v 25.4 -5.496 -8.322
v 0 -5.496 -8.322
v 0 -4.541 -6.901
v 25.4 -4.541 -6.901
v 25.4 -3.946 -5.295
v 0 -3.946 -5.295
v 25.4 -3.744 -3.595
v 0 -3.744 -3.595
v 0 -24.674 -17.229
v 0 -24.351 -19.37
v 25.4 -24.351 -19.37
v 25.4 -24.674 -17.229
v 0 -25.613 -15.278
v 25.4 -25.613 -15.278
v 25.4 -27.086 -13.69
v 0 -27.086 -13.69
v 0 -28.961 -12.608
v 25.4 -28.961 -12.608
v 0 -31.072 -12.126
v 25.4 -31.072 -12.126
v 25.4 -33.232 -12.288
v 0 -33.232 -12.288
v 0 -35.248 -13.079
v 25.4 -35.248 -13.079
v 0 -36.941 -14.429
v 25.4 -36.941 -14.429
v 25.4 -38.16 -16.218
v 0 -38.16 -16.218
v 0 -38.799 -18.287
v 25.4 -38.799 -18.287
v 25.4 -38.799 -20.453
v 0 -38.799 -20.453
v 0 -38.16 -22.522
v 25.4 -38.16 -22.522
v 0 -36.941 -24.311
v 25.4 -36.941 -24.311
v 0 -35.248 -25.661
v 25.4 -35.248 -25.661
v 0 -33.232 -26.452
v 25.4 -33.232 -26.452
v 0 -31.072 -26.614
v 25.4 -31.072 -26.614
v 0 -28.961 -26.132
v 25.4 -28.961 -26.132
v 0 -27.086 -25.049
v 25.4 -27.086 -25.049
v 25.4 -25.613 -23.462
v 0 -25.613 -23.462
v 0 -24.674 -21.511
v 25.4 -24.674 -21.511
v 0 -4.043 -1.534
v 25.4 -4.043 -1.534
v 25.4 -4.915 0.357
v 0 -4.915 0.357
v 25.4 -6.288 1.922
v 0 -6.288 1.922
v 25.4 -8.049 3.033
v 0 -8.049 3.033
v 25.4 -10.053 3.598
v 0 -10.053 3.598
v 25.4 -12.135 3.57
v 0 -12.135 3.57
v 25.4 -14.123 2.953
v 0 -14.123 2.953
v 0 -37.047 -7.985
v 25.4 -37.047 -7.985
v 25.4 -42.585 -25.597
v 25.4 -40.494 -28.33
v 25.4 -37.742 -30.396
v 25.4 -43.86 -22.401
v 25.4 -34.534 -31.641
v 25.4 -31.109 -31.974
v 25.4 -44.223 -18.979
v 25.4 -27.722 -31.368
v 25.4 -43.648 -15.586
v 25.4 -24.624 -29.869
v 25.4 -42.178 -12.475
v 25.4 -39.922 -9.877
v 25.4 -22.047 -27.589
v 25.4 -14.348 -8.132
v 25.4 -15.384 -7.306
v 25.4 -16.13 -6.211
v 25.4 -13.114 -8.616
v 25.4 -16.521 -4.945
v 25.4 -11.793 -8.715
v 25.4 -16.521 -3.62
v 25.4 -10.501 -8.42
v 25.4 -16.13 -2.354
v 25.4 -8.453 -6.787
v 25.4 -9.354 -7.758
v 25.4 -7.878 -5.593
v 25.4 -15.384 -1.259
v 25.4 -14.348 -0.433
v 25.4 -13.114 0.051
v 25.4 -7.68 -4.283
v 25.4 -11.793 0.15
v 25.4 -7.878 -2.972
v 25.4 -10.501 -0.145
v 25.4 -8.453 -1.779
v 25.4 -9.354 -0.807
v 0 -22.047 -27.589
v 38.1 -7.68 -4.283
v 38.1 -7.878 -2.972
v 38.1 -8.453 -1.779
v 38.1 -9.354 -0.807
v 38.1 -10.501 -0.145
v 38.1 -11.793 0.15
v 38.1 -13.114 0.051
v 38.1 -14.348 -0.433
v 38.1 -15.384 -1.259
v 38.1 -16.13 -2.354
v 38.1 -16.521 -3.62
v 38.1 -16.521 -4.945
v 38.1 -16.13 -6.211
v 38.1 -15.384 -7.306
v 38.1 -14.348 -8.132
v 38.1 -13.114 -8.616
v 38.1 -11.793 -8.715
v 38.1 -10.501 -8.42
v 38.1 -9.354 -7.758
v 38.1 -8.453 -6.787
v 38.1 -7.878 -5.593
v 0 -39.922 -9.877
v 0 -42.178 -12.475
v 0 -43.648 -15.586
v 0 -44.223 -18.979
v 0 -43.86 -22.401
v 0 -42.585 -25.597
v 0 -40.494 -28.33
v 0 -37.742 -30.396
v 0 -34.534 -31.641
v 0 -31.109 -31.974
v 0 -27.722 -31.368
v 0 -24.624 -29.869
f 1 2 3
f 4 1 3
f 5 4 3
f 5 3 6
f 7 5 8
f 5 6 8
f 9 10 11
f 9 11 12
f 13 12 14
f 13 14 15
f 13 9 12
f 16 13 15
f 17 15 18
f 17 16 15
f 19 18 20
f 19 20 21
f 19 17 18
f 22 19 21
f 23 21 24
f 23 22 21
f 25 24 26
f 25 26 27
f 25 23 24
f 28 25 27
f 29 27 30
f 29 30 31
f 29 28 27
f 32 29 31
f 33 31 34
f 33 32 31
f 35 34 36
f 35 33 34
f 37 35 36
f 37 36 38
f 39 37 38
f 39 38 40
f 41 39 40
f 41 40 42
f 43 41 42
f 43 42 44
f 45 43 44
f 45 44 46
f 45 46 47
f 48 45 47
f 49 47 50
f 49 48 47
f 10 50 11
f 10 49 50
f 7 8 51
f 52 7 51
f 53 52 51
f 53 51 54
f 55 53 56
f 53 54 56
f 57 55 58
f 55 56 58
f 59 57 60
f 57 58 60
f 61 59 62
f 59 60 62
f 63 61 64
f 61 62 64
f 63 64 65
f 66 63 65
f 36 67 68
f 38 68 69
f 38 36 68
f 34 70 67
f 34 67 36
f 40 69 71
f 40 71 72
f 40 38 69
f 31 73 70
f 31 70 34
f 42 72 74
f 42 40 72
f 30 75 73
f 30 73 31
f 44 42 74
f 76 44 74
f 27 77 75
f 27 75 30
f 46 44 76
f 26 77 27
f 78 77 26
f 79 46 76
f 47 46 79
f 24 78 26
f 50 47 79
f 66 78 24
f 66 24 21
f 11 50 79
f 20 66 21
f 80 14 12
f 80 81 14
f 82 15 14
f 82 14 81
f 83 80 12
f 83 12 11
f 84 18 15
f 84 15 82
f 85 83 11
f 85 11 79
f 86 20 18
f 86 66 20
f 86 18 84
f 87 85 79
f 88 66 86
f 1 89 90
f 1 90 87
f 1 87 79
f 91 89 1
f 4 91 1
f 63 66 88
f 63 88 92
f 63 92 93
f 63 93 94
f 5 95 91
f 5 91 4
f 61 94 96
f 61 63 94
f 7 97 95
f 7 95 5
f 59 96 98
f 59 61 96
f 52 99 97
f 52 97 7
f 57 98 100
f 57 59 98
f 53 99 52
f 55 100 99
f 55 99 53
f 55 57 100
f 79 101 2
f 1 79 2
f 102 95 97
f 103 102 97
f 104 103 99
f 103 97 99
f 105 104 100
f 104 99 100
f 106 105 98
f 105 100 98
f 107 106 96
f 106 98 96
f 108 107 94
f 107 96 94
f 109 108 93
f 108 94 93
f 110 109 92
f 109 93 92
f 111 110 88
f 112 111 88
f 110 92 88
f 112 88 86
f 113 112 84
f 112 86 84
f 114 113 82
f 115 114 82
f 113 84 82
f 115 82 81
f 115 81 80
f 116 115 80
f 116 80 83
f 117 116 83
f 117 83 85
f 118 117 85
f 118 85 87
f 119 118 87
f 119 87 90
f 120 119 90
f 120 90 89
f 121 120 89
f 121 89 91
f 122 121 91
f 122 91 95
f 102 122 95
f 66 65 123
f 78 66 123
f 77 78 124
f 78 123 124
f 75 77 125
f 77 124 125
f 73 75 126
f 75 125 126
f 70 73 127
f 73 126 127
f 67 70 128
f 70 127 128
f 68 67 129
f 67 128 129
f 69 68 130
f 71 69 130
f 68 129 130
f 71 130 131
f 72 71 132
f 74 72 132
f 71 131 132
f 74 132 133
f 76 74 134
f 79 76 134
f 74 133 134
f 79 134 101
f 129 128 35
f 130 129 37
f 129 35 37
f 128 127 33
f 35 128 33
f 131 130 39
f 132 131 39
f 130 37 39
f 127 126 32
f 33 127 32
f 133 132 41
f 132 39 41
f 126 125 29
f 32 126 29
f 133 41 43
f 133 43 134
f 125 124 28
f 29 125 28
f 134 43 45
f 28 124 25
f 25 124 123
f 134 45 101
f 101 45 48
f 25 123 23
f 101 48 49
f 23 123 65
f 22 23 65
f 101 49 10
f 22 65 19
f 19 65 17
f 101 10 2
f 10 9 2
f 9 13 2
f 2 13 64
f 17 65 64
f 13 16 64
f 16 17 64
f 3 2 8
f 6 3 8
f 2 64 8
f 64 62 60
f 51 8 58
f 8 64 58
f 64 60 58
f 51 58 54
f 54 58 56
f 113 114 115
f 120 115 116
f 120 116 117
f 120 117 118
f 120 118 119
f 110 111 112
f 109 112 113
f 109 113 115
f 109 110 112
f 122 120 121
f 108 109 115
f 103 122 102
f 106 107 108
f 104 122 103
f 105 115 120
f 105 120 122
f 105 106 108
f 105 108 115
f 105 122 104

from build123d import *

# Parameters (mm, degrees)
F0_R     = 7.2644
F1_DEPTH = 25.4
F2_R     = 4.445
F3_DEPTH = 38.1


with BuildPart() as f1:
    # F0 (on Right) → F1 (new body)
    with BuildSketch(Plane.YZ):
        with BuildLine():
            ThreePointArc((-22.047149, -27.589325), (-19.787361, -23.752651), (-19.001454, -19.369838))
            ThreePointArc((-19.001454, -19.369838), (-24.885128, -8.701443), (-37.047349, -7.985452))
            ThreePointArc((-37.047349, -7.985452), (-41.633101, -27.035061), (-22.047149, -27.589325))
        make_face()
        with Locations((-31.615363, -19.369838)):
            Circle(F0_R, mode=Mode.SUBTRACT)
        with BuildLine():
            ThreePointArc((-37.047349, -7.985452), (-24.885128, -8.701443), (-19.001454, -19.369838))
            ThreePointArc((-19.001454, -19.369838), (-19.787361, -23.752651), (-22.047149, -27.589325))
            Line((-22.047149, -27.589325), (-5.495977, -8.322288))
            ThreePointArc((-5.495977, -8.322288), (-16.760624, -8.003509), (-14.123179, 2.952667))
            Line((-14.123179, 2.952667), (-37.047349, -7.985452))
        make_face()
        with BuildLine():
            ThreePointArc((-3.744279, -3.594939), (-7.12821, 2.540872), (-14.123179, 2.952667))
            ThreePointArc((-14.123179, 2.952667), (-16.760624, -8.003509), (-5.495977, -8.322288))
            ThreePointArc((-5.495977, -8.322288), (-4.196284, -6.115667), (-3.744279, -3.594939))
        make_face()
    extrude(amount=F1_DEPTH)

    # F2 (on Right) → F3 (join)
    with BuildSketch(Plane.YZ):
        with Locations((-12.125393, -4.282554)):
            Circle(F2_R)
    extrude(amount=F3_DEPTH)


solid = f1.part
